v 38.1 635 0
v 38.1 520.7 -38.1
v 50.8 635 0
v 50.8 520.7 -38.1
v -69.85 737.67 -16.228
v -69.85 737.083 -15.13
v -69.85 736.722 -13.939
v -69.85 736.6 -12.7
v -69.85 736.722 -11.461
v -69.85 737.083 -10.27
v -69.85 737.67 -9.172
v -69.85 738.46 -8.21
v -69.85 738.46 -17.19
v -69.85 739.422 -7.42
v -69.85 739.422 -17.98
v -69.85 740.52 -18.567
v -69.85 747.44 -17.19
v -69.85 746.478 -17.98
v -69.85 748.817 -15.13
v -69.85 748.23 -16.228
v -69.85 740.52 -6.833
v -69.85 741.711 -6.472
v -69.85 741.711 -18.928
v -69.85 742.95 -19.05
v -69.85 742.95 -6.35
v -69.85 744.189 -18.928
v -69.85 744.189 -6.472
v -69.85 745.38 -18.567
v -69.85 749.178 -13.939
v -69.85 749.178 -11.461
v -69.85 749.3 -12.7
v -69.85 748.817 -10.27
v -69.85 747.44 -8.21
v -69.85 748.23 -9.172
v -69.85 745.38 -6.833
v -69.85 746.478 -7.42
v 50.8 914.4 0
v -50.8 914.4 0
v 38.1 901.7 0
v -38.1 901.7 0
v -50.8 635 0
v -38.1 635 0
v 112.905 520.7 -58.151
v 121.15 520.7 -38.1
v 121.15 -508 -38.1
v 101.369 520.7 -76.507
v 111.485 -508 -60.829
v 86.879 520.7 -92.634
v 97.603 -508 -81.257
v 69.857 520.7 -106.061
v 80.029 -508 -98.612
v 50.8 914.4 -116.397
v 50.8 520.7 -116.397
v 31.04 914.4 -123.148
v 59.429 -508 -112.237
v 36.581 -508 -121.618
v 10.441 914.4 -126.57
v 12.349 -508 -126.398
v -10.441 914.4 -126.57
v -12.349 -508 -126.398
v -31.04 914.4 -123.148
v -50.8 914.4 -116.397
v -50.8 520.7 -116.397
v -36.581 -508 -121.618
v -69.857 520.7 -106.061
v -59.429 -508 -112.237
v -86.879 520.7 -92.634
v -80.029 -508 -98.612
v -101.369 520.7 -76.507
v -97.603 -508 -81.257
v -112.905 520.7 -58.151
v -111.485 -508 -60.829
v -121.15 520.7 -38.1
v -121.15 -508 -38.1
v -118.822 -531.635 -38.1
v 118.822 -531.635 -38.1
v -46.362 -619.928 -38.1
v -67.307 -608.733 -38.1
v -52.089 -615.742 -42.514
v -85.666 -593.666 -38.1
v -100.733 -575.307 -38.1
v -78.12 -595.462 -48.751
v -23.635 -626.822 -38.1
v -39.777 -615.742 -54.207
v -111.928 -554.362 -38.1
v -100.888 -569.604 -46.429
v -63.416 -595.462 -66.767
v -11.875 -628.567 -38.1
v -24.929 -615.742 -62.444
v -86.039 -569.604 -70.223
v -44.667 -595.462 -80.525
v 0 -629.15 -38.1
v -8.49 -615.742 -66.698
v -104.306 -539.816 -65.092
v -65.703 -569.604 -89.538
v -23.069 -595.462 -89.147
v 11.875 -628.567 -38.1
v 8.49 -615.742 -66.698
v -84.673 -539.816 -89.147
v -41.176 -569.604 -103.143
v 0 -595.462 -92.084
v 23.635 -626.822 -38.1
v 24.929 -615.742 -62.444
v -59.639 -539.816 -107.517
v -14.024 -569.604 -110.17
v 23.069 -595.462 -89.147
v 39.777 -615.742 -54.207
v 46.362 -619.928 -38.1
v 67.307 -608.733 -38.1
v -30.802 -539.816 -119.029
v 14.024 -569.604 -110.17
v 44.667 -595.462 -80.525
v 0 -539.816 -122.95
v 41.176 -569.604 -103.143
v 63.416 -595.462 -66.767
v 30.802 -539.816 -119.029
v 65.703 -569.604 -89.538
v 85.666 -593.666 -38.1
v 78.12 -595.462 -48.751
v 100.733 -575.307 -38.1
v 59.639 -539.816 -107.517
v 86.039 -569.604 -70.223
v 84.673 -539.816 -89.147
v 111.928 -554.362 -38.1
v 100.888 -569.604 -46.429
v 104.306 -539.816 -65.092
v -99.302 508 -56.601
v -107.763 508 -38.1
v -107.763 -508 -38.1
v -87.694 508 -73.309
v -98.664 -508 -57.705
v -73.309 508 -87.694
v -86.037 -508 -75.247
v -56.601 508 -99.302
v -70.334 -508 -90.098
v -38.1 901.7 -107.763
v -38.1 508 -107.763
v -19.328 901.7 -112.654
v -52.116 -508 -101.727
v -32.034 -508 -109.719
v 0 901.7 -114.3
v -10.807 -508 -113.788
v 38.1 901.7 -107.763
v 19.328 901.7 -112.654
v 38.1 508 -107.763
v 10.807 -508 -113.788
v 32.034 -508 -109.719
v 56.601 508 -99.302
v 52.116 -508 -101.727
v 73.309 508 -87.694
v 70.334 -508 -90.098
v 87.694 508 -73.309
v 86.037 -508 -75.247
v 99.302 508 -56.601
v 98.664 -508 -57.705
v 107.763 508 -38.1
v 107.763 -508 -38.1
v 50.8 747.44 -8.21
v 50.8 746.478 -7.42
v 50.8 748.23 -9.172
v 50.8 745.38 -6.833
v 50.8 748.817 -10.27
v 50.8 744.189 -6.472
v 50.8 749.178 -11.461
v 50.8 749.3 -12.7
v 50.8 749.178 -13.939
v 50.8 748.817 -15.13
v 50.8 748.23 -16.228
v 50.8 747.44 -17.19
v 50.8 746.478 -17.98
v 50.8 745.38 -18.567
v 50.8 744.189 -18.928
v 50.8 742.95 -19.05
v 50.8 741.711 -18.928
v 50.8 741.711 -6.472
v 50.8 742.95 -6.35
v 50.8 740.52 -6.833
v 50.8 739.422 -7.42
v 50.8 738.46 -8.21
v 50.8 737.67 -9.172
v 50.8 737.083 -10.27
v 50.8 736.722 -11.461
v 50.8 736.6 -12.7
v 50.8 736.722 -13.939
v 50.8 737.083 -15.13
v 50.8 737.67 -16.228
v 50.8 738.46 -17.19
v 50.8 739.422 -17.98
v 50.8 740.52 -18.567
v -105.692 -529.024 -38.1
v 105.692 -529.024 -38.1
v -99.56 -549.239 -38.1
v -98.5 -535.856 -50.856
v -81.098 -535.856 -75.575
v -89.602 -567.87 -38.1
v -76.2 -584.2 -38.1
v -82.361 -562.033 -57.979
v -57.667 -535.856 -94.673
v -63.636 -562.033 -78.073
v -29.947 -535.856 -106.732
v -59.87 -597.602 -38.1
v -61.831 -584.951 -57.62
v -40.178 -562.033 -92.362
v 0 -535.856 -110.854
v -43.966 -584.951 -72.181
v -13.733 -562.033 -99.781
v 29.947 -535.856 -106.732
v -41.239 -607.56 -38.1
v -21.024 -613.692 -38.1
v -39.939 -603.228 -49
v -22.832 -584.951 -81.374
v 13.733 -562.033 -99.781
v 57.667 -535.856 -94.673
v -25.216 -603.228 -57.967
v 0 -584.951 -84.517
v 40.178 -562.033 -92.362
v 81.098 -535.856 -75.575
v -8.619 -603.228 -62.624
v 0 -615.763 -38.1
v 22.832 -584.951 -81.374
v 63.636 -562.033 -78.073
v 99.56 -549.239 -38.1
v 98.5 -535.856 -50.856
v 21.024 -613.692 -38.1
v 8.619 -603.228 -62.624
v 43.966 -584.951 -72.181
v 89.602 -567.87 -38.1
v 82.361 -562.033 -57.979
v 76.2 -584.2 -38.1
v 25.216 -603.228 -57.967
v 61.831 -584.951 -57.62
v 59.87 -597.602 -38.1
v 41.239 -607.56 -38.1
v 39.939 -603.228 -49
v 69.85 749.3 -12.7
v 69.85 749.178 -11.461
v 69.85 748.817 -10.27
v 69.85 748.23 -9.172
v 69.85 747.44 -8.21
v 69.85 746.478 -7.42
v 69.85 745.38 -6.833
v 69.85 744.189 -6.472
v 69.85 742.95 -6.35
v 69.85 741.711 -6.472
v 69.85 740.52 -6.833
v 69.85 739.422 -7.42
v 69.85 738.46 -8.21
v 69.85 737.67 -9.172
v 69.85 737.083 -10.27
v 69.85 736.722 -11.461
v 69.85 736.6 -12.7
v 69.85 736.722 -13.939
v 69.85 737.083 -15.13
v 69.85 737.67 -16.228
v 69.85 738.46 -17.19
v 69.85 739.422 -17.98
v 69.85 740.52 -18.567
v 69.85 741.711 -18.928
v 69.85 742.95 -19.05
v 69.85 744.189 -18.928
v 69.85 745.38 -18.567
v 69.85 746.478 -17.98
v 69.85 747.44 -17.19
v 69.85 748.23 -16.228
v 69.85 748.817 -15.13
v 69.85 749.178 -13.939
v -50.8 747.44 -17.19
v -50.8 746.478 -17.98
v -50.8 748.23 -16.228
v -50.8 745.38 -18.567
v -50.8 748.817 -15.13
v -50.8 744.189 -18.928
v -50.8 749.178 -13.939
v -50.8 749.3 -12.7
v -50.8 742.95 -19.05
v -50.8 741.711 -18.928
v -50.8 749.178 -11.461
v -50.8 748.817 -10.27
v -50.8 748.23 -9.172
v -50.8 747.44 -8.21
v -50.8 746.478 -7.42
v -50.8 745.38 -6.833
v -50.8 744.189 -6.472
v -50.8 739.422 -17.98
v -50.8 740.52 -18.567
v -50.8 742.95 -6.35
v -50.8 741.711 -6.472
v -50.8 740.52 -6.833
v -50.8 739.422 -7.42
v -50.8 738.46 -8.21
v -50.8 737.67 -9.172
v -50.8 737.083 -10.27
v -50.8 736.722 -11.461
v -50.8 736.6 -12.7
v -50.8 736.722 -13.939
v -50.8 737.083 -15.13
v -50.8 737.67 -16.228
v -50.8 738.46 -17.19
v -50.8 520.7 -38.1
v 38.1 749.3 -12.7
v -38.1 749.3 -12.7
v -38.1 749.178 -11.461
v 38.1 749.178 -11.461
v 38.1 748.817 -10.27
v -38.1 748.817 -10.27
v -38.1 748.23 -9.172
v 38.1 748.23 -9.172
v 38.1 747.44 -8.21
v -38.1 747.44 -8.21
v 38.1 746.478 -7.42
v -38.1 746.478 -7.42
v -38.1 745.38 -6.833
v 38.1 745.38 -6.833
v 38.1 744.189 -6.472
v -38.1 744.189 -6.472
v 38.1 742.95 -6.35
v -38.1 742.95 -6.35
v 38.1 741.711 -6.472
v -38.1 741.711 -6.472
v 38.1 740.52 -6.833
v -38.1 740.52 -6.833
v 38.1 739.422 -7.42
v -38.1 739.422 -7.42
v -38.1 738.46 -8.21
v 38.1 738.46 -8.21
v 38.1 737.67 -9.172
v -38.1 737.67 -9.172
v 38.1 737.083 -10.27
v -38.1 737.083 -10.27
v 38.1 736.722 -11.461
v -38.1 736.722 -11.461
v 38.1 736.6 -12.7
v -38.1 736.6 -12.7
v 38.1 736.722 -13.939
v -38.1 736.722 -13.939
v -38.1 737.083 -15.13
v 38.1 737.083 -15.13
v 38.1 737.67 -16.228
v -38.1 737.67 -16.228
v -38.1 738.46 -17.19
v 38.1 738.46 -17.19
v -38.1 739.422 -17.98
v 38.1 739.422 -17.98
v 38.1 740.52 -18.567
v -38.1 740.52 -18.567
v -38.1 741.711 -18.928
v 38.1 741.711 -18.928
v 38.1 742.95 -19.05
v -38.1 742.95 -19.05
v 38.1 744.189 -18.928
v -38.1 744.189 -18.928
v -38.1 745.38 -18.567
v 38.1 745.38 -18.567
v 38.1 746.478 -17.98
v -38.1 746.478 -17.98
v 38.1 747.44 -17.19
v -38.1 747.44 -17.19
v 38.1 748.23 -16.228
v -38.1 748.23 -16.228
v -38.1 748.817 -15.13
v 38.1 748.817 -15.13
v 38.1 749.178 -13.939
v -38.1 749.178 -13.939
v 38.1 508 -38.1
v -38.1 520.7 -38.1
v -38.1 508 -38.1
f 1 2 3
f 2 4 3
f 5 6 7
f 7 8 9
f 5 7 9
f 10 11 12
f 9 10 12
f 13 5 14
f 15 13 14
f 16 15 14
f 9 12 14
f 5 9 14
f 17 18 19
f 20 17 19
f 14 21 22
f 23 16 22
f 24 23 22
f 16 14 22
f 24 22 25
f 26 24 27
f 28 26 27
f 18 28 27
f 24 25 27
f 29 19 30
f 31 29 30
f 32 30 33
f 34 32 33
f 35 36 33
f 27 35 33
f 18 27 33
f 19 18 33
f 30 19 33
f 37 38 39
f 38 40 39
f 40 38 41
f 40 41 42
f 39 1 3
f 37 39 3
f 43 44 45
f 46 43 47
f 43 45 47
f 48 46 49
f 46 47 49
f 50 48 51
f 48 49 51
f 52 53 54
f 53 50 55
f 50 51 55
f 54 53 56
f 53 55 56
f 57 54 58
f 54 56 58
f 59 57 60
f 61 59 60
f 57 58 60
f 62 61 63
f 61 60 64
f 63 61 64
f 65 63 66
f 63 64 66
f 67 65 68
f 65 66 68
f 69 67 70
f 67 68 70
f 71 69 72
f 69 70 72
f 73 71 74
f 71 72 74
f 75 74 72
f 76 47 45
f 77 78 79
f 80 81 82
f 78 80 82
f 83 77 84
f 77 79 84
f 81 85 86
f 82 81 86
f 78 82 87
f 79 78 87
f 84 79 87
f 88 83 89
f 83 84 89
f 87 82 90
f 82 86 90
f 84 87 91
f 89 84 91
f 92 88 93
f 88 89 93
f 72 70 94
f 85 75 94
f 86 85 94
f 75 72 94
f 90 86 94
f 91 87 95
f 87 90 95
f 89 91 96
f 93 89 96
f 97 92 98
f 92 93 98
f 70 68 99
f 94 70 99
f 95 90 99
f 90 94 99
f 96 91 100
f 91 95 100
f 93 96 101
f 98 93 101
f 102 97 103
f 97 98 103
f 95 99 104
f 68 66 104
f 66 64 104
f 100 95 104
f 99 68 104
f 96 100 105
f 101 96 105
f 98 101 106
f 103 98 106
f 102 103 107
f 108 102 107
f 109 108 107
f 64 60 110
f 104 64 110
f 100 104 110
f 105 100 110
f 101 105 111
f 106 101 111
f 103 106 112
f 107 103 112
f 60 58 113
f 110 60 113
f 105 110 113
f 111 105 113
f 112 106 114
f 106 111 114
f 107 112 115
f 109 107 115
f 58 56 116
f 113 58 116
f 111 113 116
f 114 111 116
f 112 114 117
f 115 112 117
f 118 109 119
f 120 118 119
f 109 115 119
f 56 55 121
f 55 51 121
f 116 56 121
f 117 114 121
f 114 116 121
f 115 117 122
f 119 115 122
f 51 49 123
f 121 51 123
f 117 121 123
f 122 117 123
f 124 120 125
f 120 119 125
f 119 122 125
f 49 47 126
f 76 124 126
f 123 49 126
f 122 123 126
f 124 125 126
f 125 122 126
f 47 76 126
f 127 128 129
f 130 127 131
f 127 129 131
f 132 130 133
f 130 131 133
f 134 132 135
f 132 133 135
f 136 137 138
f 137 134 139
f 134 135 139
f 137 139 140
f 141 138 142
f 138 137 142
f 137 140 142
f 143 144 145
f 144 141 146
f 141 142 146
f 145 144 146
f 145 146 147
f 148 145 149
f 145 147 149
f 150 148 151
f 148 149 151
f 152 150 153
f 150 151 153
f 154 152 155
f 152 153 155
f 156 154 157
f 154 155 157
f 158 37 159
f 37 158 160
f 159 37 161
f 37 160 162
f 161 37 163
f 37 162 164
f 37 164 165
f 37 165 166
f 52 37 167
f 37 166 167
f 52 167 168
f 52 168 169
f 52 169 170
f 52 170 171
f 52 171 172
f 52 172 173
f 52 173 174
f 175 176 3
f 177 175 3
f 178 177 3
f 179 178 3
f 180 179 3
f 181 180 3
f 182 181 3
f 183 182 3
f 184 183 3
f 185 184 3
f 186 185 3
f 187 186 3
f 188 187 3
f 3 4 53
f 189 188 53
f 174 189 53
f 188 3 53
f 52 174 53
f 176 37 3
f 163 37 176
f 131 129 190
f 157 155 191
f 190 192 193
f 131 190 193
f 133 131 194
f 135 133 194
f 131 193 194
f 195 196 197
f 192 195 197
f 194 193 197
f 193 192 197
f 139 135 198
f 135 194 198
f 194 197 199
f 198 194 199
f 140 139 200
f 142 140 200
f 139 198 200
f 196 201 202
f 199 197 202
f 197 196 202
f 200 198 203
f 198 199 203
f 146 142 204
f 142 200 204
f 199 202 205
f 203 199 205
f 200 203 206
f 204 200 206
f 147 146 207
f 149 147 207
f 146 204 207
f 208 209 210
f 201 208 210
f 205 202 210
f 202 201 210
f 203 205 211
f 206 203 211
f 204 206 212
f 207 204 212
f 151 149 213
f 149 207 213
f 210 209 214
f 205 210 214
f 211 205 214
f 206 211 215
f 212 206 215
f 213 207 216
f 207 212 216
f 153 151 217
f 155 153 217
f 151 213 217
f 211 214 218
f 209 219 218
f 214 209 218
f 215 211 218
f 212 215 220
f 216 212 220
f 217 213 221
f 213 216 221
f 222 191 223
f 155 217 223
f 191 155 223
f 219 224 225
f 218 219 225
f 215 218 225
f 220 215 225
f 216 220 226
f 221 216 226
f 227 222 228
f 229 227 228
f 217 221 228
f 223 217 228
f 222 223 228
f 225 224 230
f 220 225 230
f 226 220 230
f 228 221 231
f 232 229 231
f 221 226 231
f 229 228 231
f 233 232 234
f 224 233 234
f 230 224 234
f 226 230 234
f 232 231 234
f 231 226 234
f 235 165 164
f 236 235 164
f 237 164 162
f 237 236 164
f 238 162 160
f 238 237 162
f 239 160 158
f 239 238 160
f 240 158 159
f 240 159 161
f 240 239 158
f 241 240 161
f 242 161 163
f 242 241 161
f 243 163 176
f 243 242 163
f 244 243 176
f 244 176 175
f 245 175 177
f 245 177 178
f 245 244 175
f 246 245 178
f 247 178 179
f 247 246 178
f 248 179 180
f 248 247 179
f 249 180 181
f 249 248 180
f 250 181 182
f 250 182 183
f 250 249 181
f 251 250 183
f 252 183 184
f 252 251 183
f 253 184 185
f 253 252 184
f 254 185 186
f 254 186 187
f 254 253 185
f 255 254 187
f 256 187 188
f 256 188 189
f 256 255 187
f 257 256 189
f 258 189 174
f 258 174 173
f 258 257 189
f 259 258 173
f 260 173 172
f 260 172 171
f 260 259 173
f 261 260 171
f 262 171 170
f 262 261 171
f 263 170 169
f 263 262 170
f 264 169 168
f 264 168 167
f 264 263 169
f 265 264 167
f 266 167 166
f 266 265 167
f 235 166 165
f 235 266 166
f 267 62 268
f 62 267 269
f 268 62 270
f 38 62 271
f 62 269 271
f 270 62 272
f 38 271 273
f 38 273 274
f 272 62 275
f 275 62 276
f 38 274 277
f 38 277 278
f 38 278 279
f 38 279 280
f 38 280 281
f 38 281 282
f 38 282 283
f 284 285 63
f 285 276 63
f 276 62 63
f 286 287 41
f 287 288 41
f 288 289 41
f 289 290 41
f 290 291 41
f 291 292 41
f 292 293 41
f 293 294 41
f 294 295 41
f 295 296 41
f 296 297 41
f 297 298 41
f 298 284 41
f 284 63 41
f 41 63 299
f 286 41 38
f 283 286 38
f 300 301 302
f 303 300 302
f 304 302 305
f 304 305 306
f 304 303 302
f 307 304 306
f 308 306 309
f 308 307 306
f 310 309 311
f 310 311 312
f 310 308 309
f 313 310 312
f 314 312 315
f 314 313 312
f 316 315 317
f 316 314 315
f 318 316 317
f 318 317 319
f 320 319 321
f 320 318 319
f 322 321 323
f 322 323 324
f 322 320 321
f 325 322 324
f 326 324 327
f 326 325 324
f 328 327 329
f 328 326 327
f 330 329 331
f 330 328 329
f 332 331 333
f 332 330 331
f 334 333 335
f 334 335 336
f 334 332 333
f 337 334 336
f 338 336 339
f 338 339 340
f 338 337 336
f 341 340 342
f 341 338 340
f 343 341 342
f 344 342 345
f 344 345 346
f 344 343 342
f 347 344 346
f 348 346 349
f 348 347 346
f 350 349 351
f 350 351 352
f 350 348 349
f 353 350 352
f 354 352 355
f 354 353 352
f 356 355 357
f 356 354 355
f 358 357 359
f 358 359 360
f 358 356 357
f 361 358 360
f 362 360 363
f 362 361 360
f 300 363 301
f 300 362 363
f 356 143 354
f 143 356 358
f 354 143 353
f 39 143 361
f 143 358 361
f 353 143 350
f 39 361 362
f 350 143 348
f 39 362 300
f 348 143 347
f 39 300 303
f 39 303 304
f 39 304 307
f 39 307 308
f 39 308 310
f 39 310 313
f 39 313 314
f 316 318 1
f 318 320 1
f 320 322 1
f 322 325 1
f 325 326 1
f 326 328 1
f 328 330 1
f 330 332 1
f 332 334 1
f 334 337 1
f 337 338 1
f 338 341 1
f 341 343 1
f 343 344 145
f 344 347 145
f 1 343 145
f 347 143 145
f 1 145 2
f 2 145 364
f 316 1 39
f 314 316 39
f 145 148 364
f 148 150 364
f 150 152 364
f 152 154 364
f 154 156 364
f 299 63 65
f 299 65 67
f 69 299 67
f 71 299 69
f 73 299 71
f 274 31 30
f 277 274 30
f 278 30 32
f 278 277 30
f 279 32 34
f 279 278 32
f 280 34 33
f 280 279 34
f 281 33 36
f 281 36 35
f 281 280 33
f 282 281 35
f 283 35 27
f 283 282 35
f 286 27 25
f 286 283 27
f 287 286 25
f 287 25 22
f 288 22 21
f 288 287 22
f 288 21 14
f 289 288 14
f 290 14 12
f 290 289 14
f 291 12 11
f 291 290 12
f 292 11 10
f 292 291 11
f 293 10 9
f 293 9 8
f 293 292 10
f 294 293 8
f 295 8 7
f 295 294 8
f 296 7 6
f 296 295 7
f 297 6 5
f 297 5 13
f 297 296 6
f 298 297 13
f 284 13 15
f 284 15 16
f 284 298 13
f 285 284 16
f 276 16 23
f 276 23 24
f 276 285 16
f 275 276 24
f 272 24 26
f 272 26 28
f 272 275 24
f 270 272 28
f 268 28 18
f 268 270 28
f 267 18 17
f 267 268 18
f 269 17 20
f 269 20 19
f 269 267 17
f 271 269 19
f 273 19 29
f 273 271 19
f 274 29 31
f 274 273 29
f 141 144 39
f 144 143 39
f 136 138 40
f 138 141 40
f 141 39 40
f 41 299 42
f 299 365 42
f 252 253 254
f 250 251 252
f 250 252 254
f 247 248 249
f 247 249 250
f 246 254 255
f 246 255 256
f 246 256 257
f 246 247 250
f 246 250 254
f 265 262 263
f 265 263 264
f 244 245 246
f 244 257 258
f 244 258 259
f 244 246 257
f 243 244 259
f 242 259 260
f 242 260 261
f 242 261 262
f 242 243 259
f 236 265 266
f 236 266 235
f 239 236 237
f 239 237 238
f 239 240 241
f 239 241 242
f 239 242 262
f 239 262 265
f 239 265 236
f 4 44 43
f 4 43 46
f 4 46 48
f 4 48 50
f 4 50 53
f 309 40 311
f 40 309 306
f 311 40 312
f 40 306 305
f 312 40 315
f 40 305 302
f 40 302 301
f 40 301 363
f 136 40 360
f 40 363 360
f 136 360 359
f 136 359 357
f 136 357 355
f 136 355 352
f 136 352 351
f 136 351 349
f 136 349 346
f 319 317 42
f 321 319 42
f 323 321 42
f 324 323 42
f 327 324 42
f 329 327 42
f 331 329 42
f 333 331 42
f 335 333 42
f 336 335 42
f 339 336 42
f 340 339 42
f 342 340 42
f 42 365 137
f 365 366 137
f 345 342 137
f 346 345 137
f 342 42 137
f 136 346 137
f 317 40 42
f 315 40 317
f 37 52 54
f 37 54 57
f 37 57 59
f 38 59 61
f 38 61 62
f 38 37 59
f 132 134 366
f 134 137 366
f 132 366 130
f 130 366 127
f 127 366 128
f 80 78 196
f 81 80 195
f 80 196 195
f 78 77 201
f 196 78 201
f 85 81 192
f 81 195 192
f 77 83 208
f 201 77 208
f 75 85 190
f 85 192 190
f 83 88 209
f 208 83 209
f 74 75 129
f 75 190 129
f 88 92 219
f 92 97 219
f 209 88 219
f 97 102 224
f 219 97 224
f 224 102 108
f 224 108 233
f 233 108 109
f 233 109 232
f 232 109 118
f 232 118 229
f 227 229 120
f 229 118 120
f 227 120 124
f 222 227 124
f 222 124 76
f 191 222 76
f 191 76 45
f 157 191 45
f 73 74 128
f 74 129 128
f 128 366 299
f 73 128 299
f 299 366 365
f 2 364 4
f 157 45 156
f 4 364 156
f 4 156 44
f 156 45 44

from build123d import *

# Parameters (mm, degrees)
F1_ANGLE_BACK = 90
F1_ANGLE      = 180
F3_DEPTH      = 1016
F5_DEPTH      = 12.7
F7_DEPTH      = 381
F9_DEPTH      = 12.7
F11_DEPTH     = 127
F12_R         = 6.35
F13_DEPTH     = 69.85


with BuildPart() as f1:
    # F0 (on Right) → F1 (revolve)
    with BuildSketch(Plane.YZ, mode=Mode.PRIVATE) as f1_sk:
        with BuildLine():
            Line((-622.3, 0), (-635, 0))
            ThreePointArc((-635, 0), (-597.8025612107, -89.8025612107), (-508, -127))
            Line((-508, -127), (-508, -114.3))
            ThreePointArc((-508, -114.3), (-588.8223050896, -80.8223050896), (-622.3, 0))
        make_face()
    revolve(f1_sk.sketch.rotate(Axis((0, -628.65, 0), (0, -1, 0)), -F1_ANGLE_BACK), axis=Axis((0, -628.65, 0), (0, -1, 0)), revolution_arc=F1_ANGLE)

    # F2 (on face) → F3 (join)
    with BuildSketch(Plane(origin=(0, -508, 0), x_dir=(-1, 0, 0), z_dir=(0, 1, 0))):
        with BuildLine():
            Line((-114.3, 0), (-127, 0))
            ThreePointArc((-127, 0), (0, -127), (127, 0))
            Line((127, 0), (114.3, 0))
            ThreePointArc((114.3, 0), (0, -114.3), (-114.3, 0))
        make_face()
    extrude(amount=F3_DEPTH)

    # F4 (on face) → F5 (join)
    with BuildSketch(Plane(origin=(0, 508, 0), x_dir=(-1, 0, 0), z_dir=(0, 1, 0))):
        with BuildLine():
            Line((-38.1, 0), (-127, 0))
            ThreePointArc((-127, 0), (0, -127), (127, 0))
            Line((127, 0), (38.1, 0))
            Line((38.1, 0), (38.1, -107.7630734528))
            ThreePointArc((38.1, -107.7630734528), (0, -114.3), (-38.1, -107.7630734528))
            Line((-38.1, -107.7630734528), (-38.1, 0))
        make_face()
    extrude(amount=F5_DEPTH)

    # F6 (on face) → F7 (join)
    with BuildSketch(Plane(origin=(0, 520.7, 0), x_dir=(-1, 0, 0), z_dir=(0, 1, 0))):
        with BuildLine():
            Line((-38.1, 0), (-50.8, 0))
            Line((-50.8, 0), (-50.8, -116.3974226519))
            ThreePointArc((-50.8, -116.3974226519), (0, -127), (50.8, -116.3974226519))
            Line((50.8, -116.3974226519), (50.8, 0))
            Line((50.8, 0), (38.1, 0))
            Line((38.1, 0), (38.1, -107.7630734528))
            ThreePointArc((38.1, -107.7630734528), (0, -114.3), (-38.1, -107.7630734528))
            Line((-38.1, -107.7630734528), (-38.1, 0))
        make_face()
    extrude(amount=F7_DEPTH)

    # F8 (on face) → F9 (join)
    with BuildSketch(Plane(origin=(0, 901.7, 0), x_dir=(-1, 0, 0), z_dir=(0, 1, 0))):
        with BuildLine():
            Line((-50.8, 0), (-50.8, -116.3974226519))
            ThreePointArc((-50.8, -116.3974226519), (0, -127), (50.8, -116.3974226519))
            Line((50.8, -116.3974226519), (50.8, 0))
            Line((50.8, 0), (-50.8, 0))
        make_face()
    extrude(amount=F9_DEPTH)

    # F10 (on Right) → F11 (cut, symmetric)
    with BuildSketch(Plane.YZ):
        with BuildLine():
            Line((635, 0), (-635, 0))
            ThreePointArc((-635, 0), (-633.5290511787, -19.2732278089), (-629.15027858, -38.1))
            Line((-629.15027858, -38.1), (520.7, -38.1))
            Line((520.7, -38.1), (635, 0))
        make_face()
    extrude(amount=F11_DEPTH, both=True, mode=Mode.SUBTRACT)

    # F12 (on Right) → F13 (join, symmetric)
    with BuildSketch(Plane.YZ):
        with Locations((742.95, -12.7)):
            Circle(F12_R)
    extrude(amount=F13_DEPTH, both=True)


solid = f1.part
